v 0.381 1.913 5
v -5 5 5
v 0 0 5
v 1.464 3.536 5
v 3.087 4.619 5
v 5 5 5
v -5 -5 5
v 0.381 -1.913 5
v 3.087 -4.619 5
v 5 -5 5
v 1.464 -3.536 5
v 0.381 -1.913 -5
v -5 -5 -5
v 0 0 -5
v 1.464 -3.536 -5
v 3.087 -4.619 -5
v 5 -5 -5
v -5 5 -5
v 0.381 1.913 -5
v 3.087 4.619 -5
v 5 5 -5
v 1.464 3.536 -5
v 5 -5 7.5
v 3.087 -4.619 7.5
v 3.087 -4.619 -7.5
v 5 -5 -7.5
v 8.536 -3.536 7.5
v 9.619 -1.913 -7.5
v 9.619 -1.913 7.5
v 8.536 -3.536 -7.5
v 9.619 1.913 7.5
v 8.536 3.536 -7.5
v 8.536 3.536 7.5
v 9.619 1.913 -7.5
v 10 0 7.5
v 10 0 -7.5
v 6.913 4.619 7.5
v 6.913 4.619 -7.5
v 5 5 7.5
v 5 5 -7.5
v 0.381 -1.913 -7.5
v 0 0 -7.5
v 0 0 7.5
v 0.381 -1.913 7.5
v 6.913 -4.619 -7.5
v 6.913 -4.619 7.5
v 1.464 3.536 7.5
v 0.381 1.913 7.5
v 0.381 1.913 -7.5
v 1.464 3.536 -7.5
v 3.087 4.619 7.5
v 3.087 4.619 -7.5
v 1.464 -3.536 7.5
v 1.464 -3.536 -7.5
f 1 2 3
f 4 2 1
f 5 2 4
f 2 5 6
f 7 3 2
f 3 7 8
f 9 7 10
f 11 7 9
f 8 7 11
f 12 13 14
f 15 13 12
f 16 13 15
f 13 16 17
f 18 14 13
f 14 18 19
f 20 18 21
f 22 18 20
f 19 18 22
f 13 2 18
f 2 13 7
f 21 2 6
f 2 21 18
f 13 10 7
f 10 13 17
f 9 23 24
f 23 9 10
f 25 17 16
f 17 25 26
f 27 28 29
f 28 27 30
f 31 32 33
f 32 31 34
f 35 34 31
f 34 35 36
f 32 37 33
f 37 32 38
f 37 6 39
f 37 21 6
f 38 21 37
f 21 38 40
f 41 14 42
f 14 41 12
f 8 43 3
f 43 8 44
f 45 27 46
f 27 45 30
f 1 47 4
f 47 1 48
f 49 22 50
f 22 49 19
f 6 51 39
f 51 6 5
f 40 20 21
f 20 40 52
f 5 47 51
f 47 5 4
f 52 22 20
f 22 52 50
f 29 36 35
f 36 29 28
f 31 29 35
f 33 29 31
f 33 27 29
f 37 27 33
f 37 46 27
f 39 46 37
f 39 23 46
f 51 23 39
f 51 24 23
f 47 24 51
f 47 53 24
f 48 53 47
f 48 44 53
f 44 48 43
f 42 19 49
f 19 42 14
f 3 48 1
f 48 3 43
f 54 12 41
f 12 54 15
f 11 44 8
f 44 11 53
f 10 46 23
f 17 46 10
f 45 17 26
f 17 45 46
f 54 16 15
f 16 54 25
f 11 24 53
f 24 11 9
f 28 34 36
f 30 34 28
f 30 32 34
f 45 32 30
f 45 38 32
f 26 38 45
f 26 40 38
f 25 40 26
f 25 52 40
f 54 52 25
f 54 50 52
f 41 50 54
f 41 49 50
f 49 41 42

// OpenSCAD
// Size of the Cube (all directions)
cuSize = 10;

// The diameter of the Cylinder
cyDia = 10;

// The height of the Cylinder
cyHei = 15;

// X-Translation of the Cylinder
tX = 5;

// Create Cube and move Cylinder by 'tX'
cube(size = [cuSize, cuSize, cuSize], center = true);
translate([tX, 0, 0])
    cylinder(d = cyDia, h = cyHei, center = true);
